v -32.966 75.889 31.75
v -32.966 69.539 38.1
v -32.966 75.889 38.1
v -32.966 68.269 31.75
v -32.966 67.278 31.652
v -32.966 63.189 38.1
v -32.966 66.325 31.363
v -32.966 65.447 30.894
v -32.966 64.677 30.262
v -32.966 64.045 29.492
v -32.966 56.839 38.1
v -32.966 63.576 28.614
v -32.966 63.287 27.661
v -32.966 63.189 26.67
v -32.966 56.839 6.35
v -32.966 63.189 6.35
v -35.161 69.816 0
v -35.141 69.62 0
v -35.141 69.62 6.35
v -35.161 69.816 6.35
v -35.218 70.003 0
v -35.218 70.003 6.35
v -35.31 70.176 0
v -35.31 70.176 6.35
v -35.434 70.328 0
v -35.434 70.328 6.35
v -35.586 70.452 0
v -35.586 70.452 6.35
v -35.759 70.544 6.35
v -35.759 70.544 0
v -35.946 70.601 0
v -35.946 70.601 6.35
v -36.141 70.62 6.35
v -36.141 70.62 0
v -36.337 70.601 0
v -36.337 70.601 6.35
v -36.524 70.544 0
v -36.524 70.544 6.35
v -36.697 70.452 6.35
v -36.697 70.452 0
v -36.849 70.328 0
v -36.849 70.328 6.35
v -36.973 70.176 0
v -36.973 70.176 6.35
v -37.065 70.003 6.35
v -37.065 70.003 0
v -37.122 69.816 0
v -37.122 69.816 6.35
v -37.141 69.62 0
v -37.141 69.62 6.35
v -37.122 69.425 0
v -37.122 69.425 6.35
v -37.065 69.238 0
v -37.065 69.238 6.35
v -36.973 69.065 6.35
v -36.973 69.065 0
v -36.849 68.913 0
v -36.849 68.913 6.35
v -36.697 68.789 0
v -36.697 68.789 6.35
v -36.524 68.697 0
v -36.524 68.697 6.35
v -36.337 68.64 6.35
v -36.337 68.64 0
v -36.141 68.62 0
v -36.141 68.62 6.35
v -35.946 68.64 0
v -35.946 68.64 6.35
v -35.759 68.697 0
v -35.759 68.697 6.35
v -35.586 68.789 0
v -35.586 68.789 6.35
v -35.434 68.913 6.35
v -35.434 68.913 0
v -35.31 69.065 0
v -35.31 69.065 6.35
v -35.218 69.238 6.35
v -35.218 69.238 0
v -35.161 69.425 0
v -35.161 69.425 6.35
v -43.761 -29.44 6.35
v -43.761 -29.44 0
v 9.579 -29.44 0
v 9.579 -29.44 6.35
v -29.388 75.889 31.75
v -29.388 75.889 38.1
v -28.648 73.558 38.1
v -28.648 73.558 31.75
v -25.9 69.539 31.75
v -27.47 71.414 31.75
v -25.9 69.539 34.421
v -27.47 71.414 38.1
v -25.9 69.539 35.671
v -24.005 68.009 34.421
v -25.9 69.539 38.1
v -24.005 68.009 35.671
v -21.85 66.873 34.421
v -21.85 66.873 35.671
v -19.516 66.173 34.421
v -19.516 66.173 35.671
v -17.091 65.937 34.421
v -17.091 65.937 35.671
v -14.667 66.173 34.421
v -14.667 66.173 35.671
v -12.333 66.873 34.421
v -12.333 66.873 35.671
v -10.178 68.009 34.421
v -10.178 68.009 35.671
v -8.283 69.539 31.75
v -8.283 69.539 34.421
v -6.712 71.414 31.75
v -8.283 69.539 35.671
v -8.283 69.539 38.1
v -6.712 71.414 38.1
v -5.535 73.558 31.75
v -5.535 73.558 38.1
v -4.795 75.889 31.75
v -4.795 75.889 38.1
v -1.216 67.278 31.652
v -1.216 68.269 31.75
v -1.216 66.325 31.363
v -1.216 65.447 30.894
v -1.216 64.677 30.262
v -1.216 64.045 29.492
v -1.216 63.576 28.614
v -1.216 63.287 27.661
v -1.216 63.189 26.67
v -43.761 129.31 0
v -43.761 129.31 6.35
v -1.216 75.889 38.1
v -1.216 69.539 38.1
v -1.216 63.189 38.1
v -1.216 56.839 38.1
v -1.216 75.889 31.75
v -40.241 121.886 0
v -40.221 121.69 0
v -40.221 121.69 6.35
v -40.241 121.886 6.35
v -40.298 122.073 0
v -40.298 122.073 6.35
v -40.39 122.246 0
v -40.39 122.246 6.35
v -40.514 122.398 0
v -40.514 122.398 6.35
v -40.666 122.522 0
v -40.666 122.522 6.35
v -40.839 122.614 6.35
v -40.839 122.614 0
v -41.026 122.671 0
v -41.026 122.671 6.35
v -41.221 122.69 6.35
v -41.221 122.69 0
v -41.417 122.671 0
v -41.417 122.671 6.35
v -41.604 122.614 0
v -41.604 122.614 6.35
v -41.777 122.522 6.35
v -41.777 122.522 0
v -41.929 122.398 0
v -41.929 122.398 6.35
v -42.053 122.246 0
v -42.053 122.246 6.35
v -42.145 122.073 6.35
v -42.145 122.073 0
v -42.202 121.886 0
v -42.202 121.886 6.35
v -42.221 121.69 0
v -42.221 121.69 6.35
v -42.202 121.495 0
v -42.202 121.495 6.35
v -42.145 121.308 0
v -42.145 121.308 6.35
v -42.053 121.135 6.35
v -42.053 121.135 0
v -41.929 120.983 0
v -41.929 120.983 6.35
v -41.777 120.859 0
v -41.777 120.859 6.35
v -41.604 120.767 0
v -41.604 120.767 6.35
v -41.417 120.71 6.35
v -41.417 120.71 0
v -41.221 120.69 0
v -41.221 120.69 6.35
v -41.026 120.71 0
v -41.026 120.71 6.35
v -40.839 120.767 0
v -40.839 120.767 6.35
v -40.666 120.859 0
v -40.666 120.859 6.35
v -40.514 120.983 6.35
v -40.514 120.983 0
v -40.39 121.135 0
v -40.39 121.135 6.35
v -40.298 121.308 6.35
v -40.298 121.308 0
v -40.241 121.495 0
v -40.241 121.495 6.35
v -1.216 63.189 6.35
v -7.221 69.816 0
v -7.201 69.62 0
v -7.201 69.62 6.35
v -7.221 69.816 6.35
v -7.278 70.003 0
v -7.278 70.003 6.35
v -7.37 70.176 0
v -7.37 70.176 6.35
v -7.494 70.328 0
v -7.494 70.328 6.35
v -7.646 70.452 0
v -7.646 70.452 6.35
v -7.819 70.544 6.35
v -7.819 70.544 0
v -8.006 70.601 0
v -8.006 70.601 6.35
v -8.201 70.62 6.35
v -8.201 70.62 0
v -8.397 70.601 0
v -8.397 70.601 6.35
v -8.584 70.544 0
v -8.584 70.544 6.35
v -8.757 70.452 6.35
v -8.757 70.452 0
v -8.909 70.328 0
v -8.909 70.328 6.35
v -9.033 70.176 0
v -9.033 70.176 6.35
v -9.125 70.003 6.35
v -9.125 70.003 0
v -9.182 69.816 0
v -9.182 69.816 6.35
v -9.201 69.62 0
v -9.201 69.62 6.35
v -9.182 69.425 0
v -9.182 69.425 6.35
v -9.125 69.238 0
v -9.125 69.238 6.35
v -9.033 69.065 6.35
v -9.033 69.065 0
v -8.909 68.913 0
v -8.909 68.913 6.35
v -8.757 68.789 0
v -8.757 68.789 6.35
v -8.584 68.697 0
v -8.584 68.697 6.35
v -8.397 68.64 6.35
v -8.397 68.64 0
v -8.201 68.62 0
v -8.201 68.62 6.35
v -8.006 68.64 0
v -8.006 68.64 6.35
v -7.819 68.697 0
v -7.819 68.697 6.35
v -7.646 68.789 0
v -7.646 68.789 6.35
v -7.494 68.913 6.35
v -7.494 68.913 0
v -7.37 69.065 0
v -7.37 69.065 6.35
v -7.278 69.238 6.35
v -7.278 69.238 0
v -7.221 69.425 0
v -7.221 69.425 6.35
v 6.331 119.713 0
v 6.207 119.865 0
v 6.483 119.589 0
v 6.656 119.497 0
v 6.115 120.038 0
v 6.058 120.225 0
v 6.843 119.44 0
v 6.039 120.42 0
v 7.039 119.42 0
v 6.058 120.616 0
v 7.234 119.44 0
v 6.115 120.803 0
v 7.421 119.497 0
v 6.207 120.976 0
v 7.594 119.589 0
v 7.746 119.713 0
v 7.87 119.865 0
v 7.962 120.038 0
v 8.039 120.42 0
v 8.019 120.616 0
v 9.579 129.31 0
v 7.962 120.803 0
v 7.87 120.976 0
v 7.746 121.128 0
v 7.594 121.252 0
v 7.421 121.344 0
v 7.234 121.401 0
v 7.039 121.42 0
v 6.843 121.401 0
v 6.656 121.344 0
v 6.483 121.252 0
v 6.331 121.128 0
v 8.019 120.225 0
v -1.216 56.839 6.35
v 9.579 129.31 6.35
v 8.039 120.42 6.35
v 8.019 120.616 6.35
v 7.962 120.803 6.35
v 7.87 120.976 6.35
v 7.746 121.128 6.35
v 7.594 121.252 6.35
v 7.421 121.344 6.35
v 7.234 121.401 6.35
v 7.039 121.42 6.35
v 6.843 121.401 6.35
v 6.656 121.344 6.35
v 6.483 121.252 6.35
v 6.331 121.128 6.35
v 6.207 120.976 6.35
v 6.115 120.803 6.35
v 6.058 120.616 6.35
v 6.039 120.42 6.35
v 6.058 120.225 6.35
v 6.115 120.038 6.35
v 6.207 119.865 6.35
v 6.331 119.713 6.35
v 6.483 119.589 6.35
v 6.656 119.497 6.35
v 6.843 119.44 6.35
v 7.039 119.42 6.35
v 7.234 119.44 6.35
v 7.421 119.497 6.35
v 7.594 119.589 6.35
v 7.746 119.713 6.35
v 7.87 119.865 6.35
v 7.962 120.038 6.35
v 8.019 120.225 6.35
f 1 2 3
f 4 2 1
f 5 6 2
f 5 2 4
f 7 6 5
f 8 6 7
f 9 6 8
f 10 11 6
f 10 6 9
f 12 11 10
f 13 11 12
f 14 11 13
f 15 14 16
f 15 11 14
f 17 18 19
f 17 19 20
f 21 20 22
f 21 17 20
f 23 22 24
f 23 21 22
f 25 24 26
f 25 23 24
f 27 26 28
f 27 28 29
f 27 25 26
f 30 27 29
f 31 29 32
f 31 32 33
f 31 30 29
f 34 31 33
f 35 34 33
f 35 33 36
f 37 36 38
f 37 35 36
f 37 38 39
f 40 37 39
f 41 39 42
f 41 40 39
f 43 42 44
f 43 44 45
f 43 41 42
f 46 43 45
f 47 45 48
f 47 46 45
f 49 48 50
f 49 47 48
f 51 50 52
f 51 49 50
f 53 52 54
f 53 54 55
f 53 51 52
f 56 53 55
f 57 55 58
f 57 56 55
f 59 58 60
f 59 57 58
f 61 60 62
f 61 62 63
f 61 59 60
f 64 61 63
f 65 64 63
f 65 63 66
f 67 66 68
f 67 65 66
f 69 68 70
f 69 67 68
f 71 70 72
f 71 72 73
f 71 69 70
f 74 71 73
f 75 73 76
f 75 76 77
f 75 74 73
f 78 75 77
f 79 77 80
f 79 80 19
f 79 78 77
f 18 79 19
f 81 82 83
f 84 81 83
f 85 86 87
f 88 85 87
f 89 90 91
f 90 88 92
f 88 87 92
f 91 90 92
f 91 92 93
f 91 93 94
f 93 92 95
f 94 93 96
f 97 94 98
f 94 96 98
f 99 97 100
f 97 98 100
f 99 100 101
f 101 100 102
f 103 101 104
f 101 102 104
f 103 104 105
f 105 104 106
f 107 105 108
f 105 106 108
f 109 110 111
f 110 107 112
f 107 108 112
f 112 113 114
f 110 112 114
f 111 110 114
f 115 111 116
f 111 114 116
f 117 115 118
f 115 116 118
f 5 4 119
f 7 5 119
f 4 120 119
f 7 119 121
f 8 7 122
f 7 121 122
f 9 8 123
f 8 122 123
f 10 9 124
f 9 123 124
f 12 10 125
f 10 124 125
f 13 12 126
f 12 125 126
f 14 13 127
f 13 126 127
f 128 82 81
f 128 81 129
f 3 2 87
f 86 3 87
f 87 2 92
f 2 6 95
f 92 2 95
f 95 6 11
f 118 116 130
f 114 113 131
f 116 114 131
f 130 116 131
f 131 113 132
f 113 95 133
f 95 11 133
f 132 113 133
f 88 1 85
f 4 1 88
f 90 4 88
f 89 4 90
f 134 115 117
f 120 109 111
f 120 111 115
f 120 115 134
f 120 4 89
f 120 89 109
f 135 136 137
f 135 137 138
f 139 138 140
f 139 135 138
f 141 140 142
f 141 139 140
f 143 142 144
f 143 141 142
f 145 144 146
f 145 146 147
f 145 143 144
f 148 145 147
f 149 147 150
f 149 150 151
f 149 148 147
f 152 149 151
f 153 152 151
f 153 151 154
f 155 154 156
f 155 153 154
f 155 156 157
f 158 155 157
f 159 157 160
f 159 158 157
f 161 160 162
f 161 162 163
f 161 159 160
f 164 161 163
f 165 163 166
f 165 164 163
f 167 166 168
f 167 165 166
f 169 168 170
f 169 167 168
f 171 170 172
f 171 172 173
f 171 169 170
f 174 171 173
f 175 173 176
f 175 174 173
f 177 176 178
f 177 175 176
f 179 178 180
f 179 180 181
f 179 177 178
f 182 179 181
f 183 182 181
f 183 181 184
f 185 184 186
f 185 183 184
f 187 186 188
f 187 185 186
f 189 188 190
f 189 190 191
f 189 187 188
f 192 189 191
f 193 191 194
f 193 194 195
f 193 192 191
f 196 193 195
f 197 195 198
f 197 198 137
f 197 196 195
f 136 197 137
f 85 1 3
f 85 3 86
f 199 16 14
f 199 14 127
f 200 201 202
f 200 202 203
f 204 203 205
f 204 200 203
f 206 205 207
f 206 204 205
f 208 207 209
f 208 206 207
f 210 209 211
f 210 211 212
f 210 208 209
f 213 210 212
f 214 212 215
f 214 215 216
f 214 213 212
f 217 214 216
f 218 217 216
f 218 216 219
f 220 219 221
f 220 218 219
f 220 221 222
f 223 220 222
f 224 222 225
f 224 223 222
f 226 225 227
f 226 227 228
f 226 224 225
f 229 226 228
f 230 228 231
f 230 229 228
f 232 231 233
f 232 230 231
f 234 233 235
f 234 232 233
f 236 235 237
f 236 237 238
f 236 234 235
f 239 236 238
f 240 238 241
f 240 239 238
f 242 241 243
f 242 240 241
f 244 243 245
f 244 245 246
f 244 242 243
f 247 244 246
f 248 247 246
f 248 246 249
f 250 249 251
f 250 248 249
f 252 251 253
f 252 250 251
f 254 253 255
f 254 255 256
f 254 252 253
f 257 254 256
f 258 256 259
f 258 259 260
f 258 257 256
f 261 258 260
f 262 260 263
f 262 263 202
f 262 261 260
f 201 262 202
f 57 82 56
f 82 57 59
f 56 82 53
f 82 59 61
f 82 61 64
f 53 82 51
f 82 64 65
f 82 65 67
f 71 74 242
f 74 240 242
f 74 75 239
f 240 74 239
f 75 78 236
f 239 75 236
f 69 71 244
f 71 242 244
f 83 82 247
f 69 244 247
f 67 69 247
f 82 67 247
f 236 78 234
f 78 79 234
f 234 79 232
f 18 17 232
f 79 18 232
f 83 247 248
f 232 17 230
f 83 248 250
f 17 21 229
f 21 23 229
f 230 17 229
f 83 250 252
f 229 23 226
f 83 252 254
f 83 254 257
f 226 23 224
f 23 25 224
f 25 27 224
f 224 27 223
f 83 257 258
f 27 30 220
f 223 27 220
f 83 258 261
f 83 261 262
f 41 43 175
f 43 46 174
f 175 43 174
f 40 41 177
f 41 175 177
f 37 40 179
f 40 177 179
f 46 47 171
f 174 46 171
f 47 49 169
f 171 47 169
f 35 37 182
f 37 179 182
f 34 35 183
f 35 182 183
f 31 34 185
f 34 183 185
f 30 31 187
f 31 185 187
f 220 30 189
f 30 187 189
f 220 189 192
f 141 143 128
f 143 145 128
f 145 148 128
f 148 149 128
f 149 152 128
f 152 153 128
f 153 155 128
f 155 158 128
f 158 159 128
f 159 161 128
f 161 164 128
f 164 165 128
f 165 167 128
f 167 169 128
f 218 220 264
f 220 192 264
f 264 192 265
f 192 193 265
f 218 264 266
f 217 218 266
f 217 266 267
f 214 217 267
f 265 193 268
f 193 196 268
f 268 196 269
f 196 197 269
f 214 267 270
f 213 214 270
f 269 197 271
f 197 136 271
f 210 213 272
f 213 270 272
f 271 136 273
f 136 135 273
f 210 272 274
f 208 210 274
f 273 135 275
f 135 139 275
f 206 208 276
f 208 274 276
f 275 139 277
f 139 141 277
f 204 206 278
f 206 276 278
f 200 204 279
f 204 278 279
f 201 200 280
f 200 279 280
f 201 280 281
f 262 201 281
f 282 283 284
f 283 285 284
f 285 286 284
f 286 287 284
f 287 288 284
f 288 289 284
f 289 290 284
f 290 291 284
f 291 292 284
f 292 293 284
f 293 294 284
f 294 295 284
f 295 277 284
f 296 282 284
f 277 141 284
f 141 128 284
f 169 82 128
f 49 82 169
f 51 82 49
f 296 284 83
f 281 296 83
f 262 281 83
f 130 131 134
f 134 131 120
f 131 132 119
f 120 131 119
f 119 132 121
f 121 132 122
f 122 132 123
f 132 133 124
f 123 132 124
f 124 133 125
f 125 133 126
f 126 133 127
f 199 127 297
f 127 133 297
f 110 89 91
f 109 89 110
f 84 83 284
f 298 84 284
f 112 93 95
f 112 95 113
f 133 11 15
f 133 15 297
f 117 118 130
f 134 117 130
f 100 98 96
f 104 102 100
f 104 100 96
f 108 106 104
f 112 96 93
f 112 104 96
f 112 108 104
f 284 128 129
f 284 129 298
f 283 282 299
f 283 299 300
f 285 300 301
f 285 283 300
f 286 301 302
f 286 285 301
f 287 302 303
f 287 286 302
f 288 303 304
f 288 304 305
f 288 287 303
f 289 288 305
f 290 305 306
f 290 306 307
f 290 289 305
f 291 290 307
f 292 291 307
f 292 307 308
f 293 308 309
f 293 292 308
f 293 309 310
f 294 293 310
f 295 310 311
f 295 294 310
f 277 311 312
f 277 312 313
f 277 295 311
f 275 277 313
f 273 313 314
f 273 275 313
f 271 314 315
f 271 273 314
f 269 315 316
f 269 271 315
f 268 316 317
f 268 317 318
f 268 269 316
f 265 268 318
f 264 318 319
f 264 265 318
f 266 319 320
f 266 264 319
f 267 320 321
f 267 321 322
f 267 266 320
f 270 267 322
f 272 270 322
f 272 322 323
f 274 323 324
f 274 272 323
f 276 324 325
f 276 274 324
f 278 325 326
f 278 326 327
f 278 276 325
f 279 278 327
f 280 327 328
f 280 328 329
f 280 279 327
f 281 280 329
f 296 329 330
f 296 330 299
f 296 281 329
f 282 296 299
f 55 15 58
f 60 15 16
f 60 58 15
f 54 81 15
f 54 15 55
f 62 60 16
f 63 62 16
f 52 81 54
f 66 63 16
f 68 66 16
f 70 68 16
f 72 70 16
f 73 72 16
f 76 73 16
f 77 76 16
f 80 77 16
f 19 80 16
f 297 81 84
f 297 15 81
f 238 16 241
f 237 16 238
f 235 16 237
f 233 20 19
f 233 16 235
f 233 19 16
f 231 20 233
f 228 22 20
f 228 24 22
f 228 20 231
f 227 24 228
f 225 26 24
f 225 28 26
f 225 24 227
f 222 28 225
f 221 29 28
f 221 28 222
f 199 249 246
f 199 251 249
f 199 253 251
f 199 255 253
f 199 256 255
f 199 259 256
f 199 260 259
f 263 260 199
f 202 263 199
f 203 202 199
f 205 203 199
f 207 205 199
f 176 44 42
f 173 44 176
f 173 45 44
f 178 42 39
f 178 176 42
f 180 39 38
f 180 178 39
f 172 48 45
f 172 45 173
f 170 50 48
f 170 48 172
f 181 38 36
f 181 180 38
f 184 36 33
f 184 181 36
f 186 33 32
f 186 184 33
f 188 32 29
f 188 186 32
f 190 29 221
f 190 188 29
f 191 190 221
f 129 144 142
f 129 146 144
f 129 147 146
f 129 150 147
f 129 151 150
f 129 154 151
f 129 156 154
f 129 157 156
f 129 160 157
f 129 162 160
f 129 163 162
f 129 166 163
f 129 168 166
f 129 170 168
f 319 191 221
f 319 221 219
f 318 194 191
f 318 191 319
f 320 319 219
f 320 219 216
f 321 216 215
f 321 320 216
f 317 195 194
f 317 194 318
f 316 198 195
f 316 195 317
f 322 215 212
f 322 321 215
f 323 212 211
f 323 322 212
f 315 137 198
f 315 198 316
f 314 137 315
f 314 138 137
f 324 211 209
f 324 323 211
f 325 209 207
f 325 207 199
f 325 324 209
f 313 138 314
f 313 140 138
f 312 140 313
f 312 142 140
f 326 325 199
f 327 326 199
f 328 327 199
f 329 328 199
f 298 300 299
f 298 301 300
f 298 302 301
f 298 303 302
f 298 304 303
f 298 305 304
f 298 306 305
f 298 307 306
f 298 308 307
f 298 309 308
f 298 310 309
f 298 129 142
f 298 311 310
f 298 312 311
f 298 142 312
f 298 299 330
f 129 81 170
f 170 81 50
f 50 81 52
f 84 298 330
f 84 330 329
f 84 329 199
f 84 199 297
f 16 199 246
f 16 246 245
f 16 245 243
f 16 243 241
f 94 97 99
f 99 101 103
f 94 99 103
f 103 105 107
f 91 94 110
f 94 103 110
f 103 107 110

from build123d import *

# Parameters (mm, degrees)
SKETCH1_W           = 53.34
SKETCH1_H           = 158.75
SKETCH1_R           = 1
BOSS_EXTRUDE1_DEPTH = 6.35
SKETCH2_W           = 31.75
SKETCH2_H           = 6.35
BOSS_EXTRUDE2_DEPTH = 31.75
SKETCH3_W           = 31.75
SKETCH3_H           = 6.35
BOSS_EXTRUDE3_DEPTH = 12.7
CUT_EXTRUDE1_REACH  = 143.732
SKETCH4_R           = 12.573
SKETCH5_W           = 31.75
SKETCH5_H           = 2.671239047
SKETCH5_H_2         = 2.428760953
BOSS_EXTRUDE4_DEPTH = 6.35
FILLET1_R           = 5.08


with BuildPart() as part:
    # Sketch1 → Boss-Extrude1 (new body)
    with BuildSketch(Plane.XY):
        with Locations((-17.091445783, 49.935481928)):
            Rectangle(SKETCH1_W, SKETCH1_H)
        with Locations((-36.141445783, 69.620481928)):
            Circle(SKETCH1_R, mode=Mode.SUBTRACT)
        with Locations((-8.201445783, 69.620481928)):
            Circle(SKETCH1_R, mode=Mode.SUBTRACT)
        with Locations((-41.221445783, 121.690481928)):
            Circle(SKETCH1_R, mode=Mode.SUBTRACT)
        with Locations((7.038554217, 120.420481928)):
            Circle(SKETCH1_R, mode=Mode.SUBTRACT)
    extrude(amount=BOSS_EXTRUDE1_DEPTH)

    # Sketch2 → Boss-Extrude2 (add)
    with BuildSketch(Plane.XY.offset(6.35)):
        with Locations((-17.091445783, 60.014063864)):
            Rectangle(SKETCH2_W, SKETCH2_H)
    extrude(amount=BOSS_EXTRUDE2_DEPTH)

    # Sketch3 → Boss-Extrude3 (add)
    with BuildSketch(Plane(origin=(0, 63.189063864, 0), x_dir=(1, 0, 0), z_dir=(0, 1, 0))):
        with Locations((-17.091445783, -34.925)):
            Rectangle(SKETCH3_W, SKETCH3_H)
    extrude(amount=BOSS_EXTRUDE3_DEPTH)

    # Sketch4 → Cut-Extrude1 (cut, up to next)
    with BuildSketch(Plane.XY.offset(38.1), mode=Mode.PRIVATE) as cut_extrude1_sk1:
        with Locations((-17.091445783, 78.510481928)):
            Circle(SKETCH4_R)
    cut_extrude1_tool1 = extrude(cut_extrude1_sk1.sketch, amount=-CUT_EXTRUDE1_REACH, mode=Mode.PRIVATE) & part.part
    add(cut_extrude1_tool1.solids().sort_by_distance((-17.091446, 78.510482, 38.1))[0], mode=Mode.SUBTRACT)

    # Sketch5 → Boss-Extrude4 (add)
    with BuildSketch(Plane(origin=(0, 63.189063864, 0), x_dir=(1, 0, 0), z_dir=(0, 1, 0))):
        with Locations((-17.091445783, -33.085619524)):
            Rectangle(SKETCH5_W, SKETCH5_H)
        with Locations((-17.091445783, -36.885619523)):
            Rectangle(SKETCH5_W, SKETCH5_H_2)
    extrude(amount=BOSS_EXTRUDE4_DEPTH)

    # Fillet1
    fillet1_edges = [part.edges().sort_by_distance(p)[0] for p in [
        (-17.091445783, 63.189063864, 31.75),
    ]]
    fillet(fillet1_edges, radius=FILLET1_R)


solid = part.part
